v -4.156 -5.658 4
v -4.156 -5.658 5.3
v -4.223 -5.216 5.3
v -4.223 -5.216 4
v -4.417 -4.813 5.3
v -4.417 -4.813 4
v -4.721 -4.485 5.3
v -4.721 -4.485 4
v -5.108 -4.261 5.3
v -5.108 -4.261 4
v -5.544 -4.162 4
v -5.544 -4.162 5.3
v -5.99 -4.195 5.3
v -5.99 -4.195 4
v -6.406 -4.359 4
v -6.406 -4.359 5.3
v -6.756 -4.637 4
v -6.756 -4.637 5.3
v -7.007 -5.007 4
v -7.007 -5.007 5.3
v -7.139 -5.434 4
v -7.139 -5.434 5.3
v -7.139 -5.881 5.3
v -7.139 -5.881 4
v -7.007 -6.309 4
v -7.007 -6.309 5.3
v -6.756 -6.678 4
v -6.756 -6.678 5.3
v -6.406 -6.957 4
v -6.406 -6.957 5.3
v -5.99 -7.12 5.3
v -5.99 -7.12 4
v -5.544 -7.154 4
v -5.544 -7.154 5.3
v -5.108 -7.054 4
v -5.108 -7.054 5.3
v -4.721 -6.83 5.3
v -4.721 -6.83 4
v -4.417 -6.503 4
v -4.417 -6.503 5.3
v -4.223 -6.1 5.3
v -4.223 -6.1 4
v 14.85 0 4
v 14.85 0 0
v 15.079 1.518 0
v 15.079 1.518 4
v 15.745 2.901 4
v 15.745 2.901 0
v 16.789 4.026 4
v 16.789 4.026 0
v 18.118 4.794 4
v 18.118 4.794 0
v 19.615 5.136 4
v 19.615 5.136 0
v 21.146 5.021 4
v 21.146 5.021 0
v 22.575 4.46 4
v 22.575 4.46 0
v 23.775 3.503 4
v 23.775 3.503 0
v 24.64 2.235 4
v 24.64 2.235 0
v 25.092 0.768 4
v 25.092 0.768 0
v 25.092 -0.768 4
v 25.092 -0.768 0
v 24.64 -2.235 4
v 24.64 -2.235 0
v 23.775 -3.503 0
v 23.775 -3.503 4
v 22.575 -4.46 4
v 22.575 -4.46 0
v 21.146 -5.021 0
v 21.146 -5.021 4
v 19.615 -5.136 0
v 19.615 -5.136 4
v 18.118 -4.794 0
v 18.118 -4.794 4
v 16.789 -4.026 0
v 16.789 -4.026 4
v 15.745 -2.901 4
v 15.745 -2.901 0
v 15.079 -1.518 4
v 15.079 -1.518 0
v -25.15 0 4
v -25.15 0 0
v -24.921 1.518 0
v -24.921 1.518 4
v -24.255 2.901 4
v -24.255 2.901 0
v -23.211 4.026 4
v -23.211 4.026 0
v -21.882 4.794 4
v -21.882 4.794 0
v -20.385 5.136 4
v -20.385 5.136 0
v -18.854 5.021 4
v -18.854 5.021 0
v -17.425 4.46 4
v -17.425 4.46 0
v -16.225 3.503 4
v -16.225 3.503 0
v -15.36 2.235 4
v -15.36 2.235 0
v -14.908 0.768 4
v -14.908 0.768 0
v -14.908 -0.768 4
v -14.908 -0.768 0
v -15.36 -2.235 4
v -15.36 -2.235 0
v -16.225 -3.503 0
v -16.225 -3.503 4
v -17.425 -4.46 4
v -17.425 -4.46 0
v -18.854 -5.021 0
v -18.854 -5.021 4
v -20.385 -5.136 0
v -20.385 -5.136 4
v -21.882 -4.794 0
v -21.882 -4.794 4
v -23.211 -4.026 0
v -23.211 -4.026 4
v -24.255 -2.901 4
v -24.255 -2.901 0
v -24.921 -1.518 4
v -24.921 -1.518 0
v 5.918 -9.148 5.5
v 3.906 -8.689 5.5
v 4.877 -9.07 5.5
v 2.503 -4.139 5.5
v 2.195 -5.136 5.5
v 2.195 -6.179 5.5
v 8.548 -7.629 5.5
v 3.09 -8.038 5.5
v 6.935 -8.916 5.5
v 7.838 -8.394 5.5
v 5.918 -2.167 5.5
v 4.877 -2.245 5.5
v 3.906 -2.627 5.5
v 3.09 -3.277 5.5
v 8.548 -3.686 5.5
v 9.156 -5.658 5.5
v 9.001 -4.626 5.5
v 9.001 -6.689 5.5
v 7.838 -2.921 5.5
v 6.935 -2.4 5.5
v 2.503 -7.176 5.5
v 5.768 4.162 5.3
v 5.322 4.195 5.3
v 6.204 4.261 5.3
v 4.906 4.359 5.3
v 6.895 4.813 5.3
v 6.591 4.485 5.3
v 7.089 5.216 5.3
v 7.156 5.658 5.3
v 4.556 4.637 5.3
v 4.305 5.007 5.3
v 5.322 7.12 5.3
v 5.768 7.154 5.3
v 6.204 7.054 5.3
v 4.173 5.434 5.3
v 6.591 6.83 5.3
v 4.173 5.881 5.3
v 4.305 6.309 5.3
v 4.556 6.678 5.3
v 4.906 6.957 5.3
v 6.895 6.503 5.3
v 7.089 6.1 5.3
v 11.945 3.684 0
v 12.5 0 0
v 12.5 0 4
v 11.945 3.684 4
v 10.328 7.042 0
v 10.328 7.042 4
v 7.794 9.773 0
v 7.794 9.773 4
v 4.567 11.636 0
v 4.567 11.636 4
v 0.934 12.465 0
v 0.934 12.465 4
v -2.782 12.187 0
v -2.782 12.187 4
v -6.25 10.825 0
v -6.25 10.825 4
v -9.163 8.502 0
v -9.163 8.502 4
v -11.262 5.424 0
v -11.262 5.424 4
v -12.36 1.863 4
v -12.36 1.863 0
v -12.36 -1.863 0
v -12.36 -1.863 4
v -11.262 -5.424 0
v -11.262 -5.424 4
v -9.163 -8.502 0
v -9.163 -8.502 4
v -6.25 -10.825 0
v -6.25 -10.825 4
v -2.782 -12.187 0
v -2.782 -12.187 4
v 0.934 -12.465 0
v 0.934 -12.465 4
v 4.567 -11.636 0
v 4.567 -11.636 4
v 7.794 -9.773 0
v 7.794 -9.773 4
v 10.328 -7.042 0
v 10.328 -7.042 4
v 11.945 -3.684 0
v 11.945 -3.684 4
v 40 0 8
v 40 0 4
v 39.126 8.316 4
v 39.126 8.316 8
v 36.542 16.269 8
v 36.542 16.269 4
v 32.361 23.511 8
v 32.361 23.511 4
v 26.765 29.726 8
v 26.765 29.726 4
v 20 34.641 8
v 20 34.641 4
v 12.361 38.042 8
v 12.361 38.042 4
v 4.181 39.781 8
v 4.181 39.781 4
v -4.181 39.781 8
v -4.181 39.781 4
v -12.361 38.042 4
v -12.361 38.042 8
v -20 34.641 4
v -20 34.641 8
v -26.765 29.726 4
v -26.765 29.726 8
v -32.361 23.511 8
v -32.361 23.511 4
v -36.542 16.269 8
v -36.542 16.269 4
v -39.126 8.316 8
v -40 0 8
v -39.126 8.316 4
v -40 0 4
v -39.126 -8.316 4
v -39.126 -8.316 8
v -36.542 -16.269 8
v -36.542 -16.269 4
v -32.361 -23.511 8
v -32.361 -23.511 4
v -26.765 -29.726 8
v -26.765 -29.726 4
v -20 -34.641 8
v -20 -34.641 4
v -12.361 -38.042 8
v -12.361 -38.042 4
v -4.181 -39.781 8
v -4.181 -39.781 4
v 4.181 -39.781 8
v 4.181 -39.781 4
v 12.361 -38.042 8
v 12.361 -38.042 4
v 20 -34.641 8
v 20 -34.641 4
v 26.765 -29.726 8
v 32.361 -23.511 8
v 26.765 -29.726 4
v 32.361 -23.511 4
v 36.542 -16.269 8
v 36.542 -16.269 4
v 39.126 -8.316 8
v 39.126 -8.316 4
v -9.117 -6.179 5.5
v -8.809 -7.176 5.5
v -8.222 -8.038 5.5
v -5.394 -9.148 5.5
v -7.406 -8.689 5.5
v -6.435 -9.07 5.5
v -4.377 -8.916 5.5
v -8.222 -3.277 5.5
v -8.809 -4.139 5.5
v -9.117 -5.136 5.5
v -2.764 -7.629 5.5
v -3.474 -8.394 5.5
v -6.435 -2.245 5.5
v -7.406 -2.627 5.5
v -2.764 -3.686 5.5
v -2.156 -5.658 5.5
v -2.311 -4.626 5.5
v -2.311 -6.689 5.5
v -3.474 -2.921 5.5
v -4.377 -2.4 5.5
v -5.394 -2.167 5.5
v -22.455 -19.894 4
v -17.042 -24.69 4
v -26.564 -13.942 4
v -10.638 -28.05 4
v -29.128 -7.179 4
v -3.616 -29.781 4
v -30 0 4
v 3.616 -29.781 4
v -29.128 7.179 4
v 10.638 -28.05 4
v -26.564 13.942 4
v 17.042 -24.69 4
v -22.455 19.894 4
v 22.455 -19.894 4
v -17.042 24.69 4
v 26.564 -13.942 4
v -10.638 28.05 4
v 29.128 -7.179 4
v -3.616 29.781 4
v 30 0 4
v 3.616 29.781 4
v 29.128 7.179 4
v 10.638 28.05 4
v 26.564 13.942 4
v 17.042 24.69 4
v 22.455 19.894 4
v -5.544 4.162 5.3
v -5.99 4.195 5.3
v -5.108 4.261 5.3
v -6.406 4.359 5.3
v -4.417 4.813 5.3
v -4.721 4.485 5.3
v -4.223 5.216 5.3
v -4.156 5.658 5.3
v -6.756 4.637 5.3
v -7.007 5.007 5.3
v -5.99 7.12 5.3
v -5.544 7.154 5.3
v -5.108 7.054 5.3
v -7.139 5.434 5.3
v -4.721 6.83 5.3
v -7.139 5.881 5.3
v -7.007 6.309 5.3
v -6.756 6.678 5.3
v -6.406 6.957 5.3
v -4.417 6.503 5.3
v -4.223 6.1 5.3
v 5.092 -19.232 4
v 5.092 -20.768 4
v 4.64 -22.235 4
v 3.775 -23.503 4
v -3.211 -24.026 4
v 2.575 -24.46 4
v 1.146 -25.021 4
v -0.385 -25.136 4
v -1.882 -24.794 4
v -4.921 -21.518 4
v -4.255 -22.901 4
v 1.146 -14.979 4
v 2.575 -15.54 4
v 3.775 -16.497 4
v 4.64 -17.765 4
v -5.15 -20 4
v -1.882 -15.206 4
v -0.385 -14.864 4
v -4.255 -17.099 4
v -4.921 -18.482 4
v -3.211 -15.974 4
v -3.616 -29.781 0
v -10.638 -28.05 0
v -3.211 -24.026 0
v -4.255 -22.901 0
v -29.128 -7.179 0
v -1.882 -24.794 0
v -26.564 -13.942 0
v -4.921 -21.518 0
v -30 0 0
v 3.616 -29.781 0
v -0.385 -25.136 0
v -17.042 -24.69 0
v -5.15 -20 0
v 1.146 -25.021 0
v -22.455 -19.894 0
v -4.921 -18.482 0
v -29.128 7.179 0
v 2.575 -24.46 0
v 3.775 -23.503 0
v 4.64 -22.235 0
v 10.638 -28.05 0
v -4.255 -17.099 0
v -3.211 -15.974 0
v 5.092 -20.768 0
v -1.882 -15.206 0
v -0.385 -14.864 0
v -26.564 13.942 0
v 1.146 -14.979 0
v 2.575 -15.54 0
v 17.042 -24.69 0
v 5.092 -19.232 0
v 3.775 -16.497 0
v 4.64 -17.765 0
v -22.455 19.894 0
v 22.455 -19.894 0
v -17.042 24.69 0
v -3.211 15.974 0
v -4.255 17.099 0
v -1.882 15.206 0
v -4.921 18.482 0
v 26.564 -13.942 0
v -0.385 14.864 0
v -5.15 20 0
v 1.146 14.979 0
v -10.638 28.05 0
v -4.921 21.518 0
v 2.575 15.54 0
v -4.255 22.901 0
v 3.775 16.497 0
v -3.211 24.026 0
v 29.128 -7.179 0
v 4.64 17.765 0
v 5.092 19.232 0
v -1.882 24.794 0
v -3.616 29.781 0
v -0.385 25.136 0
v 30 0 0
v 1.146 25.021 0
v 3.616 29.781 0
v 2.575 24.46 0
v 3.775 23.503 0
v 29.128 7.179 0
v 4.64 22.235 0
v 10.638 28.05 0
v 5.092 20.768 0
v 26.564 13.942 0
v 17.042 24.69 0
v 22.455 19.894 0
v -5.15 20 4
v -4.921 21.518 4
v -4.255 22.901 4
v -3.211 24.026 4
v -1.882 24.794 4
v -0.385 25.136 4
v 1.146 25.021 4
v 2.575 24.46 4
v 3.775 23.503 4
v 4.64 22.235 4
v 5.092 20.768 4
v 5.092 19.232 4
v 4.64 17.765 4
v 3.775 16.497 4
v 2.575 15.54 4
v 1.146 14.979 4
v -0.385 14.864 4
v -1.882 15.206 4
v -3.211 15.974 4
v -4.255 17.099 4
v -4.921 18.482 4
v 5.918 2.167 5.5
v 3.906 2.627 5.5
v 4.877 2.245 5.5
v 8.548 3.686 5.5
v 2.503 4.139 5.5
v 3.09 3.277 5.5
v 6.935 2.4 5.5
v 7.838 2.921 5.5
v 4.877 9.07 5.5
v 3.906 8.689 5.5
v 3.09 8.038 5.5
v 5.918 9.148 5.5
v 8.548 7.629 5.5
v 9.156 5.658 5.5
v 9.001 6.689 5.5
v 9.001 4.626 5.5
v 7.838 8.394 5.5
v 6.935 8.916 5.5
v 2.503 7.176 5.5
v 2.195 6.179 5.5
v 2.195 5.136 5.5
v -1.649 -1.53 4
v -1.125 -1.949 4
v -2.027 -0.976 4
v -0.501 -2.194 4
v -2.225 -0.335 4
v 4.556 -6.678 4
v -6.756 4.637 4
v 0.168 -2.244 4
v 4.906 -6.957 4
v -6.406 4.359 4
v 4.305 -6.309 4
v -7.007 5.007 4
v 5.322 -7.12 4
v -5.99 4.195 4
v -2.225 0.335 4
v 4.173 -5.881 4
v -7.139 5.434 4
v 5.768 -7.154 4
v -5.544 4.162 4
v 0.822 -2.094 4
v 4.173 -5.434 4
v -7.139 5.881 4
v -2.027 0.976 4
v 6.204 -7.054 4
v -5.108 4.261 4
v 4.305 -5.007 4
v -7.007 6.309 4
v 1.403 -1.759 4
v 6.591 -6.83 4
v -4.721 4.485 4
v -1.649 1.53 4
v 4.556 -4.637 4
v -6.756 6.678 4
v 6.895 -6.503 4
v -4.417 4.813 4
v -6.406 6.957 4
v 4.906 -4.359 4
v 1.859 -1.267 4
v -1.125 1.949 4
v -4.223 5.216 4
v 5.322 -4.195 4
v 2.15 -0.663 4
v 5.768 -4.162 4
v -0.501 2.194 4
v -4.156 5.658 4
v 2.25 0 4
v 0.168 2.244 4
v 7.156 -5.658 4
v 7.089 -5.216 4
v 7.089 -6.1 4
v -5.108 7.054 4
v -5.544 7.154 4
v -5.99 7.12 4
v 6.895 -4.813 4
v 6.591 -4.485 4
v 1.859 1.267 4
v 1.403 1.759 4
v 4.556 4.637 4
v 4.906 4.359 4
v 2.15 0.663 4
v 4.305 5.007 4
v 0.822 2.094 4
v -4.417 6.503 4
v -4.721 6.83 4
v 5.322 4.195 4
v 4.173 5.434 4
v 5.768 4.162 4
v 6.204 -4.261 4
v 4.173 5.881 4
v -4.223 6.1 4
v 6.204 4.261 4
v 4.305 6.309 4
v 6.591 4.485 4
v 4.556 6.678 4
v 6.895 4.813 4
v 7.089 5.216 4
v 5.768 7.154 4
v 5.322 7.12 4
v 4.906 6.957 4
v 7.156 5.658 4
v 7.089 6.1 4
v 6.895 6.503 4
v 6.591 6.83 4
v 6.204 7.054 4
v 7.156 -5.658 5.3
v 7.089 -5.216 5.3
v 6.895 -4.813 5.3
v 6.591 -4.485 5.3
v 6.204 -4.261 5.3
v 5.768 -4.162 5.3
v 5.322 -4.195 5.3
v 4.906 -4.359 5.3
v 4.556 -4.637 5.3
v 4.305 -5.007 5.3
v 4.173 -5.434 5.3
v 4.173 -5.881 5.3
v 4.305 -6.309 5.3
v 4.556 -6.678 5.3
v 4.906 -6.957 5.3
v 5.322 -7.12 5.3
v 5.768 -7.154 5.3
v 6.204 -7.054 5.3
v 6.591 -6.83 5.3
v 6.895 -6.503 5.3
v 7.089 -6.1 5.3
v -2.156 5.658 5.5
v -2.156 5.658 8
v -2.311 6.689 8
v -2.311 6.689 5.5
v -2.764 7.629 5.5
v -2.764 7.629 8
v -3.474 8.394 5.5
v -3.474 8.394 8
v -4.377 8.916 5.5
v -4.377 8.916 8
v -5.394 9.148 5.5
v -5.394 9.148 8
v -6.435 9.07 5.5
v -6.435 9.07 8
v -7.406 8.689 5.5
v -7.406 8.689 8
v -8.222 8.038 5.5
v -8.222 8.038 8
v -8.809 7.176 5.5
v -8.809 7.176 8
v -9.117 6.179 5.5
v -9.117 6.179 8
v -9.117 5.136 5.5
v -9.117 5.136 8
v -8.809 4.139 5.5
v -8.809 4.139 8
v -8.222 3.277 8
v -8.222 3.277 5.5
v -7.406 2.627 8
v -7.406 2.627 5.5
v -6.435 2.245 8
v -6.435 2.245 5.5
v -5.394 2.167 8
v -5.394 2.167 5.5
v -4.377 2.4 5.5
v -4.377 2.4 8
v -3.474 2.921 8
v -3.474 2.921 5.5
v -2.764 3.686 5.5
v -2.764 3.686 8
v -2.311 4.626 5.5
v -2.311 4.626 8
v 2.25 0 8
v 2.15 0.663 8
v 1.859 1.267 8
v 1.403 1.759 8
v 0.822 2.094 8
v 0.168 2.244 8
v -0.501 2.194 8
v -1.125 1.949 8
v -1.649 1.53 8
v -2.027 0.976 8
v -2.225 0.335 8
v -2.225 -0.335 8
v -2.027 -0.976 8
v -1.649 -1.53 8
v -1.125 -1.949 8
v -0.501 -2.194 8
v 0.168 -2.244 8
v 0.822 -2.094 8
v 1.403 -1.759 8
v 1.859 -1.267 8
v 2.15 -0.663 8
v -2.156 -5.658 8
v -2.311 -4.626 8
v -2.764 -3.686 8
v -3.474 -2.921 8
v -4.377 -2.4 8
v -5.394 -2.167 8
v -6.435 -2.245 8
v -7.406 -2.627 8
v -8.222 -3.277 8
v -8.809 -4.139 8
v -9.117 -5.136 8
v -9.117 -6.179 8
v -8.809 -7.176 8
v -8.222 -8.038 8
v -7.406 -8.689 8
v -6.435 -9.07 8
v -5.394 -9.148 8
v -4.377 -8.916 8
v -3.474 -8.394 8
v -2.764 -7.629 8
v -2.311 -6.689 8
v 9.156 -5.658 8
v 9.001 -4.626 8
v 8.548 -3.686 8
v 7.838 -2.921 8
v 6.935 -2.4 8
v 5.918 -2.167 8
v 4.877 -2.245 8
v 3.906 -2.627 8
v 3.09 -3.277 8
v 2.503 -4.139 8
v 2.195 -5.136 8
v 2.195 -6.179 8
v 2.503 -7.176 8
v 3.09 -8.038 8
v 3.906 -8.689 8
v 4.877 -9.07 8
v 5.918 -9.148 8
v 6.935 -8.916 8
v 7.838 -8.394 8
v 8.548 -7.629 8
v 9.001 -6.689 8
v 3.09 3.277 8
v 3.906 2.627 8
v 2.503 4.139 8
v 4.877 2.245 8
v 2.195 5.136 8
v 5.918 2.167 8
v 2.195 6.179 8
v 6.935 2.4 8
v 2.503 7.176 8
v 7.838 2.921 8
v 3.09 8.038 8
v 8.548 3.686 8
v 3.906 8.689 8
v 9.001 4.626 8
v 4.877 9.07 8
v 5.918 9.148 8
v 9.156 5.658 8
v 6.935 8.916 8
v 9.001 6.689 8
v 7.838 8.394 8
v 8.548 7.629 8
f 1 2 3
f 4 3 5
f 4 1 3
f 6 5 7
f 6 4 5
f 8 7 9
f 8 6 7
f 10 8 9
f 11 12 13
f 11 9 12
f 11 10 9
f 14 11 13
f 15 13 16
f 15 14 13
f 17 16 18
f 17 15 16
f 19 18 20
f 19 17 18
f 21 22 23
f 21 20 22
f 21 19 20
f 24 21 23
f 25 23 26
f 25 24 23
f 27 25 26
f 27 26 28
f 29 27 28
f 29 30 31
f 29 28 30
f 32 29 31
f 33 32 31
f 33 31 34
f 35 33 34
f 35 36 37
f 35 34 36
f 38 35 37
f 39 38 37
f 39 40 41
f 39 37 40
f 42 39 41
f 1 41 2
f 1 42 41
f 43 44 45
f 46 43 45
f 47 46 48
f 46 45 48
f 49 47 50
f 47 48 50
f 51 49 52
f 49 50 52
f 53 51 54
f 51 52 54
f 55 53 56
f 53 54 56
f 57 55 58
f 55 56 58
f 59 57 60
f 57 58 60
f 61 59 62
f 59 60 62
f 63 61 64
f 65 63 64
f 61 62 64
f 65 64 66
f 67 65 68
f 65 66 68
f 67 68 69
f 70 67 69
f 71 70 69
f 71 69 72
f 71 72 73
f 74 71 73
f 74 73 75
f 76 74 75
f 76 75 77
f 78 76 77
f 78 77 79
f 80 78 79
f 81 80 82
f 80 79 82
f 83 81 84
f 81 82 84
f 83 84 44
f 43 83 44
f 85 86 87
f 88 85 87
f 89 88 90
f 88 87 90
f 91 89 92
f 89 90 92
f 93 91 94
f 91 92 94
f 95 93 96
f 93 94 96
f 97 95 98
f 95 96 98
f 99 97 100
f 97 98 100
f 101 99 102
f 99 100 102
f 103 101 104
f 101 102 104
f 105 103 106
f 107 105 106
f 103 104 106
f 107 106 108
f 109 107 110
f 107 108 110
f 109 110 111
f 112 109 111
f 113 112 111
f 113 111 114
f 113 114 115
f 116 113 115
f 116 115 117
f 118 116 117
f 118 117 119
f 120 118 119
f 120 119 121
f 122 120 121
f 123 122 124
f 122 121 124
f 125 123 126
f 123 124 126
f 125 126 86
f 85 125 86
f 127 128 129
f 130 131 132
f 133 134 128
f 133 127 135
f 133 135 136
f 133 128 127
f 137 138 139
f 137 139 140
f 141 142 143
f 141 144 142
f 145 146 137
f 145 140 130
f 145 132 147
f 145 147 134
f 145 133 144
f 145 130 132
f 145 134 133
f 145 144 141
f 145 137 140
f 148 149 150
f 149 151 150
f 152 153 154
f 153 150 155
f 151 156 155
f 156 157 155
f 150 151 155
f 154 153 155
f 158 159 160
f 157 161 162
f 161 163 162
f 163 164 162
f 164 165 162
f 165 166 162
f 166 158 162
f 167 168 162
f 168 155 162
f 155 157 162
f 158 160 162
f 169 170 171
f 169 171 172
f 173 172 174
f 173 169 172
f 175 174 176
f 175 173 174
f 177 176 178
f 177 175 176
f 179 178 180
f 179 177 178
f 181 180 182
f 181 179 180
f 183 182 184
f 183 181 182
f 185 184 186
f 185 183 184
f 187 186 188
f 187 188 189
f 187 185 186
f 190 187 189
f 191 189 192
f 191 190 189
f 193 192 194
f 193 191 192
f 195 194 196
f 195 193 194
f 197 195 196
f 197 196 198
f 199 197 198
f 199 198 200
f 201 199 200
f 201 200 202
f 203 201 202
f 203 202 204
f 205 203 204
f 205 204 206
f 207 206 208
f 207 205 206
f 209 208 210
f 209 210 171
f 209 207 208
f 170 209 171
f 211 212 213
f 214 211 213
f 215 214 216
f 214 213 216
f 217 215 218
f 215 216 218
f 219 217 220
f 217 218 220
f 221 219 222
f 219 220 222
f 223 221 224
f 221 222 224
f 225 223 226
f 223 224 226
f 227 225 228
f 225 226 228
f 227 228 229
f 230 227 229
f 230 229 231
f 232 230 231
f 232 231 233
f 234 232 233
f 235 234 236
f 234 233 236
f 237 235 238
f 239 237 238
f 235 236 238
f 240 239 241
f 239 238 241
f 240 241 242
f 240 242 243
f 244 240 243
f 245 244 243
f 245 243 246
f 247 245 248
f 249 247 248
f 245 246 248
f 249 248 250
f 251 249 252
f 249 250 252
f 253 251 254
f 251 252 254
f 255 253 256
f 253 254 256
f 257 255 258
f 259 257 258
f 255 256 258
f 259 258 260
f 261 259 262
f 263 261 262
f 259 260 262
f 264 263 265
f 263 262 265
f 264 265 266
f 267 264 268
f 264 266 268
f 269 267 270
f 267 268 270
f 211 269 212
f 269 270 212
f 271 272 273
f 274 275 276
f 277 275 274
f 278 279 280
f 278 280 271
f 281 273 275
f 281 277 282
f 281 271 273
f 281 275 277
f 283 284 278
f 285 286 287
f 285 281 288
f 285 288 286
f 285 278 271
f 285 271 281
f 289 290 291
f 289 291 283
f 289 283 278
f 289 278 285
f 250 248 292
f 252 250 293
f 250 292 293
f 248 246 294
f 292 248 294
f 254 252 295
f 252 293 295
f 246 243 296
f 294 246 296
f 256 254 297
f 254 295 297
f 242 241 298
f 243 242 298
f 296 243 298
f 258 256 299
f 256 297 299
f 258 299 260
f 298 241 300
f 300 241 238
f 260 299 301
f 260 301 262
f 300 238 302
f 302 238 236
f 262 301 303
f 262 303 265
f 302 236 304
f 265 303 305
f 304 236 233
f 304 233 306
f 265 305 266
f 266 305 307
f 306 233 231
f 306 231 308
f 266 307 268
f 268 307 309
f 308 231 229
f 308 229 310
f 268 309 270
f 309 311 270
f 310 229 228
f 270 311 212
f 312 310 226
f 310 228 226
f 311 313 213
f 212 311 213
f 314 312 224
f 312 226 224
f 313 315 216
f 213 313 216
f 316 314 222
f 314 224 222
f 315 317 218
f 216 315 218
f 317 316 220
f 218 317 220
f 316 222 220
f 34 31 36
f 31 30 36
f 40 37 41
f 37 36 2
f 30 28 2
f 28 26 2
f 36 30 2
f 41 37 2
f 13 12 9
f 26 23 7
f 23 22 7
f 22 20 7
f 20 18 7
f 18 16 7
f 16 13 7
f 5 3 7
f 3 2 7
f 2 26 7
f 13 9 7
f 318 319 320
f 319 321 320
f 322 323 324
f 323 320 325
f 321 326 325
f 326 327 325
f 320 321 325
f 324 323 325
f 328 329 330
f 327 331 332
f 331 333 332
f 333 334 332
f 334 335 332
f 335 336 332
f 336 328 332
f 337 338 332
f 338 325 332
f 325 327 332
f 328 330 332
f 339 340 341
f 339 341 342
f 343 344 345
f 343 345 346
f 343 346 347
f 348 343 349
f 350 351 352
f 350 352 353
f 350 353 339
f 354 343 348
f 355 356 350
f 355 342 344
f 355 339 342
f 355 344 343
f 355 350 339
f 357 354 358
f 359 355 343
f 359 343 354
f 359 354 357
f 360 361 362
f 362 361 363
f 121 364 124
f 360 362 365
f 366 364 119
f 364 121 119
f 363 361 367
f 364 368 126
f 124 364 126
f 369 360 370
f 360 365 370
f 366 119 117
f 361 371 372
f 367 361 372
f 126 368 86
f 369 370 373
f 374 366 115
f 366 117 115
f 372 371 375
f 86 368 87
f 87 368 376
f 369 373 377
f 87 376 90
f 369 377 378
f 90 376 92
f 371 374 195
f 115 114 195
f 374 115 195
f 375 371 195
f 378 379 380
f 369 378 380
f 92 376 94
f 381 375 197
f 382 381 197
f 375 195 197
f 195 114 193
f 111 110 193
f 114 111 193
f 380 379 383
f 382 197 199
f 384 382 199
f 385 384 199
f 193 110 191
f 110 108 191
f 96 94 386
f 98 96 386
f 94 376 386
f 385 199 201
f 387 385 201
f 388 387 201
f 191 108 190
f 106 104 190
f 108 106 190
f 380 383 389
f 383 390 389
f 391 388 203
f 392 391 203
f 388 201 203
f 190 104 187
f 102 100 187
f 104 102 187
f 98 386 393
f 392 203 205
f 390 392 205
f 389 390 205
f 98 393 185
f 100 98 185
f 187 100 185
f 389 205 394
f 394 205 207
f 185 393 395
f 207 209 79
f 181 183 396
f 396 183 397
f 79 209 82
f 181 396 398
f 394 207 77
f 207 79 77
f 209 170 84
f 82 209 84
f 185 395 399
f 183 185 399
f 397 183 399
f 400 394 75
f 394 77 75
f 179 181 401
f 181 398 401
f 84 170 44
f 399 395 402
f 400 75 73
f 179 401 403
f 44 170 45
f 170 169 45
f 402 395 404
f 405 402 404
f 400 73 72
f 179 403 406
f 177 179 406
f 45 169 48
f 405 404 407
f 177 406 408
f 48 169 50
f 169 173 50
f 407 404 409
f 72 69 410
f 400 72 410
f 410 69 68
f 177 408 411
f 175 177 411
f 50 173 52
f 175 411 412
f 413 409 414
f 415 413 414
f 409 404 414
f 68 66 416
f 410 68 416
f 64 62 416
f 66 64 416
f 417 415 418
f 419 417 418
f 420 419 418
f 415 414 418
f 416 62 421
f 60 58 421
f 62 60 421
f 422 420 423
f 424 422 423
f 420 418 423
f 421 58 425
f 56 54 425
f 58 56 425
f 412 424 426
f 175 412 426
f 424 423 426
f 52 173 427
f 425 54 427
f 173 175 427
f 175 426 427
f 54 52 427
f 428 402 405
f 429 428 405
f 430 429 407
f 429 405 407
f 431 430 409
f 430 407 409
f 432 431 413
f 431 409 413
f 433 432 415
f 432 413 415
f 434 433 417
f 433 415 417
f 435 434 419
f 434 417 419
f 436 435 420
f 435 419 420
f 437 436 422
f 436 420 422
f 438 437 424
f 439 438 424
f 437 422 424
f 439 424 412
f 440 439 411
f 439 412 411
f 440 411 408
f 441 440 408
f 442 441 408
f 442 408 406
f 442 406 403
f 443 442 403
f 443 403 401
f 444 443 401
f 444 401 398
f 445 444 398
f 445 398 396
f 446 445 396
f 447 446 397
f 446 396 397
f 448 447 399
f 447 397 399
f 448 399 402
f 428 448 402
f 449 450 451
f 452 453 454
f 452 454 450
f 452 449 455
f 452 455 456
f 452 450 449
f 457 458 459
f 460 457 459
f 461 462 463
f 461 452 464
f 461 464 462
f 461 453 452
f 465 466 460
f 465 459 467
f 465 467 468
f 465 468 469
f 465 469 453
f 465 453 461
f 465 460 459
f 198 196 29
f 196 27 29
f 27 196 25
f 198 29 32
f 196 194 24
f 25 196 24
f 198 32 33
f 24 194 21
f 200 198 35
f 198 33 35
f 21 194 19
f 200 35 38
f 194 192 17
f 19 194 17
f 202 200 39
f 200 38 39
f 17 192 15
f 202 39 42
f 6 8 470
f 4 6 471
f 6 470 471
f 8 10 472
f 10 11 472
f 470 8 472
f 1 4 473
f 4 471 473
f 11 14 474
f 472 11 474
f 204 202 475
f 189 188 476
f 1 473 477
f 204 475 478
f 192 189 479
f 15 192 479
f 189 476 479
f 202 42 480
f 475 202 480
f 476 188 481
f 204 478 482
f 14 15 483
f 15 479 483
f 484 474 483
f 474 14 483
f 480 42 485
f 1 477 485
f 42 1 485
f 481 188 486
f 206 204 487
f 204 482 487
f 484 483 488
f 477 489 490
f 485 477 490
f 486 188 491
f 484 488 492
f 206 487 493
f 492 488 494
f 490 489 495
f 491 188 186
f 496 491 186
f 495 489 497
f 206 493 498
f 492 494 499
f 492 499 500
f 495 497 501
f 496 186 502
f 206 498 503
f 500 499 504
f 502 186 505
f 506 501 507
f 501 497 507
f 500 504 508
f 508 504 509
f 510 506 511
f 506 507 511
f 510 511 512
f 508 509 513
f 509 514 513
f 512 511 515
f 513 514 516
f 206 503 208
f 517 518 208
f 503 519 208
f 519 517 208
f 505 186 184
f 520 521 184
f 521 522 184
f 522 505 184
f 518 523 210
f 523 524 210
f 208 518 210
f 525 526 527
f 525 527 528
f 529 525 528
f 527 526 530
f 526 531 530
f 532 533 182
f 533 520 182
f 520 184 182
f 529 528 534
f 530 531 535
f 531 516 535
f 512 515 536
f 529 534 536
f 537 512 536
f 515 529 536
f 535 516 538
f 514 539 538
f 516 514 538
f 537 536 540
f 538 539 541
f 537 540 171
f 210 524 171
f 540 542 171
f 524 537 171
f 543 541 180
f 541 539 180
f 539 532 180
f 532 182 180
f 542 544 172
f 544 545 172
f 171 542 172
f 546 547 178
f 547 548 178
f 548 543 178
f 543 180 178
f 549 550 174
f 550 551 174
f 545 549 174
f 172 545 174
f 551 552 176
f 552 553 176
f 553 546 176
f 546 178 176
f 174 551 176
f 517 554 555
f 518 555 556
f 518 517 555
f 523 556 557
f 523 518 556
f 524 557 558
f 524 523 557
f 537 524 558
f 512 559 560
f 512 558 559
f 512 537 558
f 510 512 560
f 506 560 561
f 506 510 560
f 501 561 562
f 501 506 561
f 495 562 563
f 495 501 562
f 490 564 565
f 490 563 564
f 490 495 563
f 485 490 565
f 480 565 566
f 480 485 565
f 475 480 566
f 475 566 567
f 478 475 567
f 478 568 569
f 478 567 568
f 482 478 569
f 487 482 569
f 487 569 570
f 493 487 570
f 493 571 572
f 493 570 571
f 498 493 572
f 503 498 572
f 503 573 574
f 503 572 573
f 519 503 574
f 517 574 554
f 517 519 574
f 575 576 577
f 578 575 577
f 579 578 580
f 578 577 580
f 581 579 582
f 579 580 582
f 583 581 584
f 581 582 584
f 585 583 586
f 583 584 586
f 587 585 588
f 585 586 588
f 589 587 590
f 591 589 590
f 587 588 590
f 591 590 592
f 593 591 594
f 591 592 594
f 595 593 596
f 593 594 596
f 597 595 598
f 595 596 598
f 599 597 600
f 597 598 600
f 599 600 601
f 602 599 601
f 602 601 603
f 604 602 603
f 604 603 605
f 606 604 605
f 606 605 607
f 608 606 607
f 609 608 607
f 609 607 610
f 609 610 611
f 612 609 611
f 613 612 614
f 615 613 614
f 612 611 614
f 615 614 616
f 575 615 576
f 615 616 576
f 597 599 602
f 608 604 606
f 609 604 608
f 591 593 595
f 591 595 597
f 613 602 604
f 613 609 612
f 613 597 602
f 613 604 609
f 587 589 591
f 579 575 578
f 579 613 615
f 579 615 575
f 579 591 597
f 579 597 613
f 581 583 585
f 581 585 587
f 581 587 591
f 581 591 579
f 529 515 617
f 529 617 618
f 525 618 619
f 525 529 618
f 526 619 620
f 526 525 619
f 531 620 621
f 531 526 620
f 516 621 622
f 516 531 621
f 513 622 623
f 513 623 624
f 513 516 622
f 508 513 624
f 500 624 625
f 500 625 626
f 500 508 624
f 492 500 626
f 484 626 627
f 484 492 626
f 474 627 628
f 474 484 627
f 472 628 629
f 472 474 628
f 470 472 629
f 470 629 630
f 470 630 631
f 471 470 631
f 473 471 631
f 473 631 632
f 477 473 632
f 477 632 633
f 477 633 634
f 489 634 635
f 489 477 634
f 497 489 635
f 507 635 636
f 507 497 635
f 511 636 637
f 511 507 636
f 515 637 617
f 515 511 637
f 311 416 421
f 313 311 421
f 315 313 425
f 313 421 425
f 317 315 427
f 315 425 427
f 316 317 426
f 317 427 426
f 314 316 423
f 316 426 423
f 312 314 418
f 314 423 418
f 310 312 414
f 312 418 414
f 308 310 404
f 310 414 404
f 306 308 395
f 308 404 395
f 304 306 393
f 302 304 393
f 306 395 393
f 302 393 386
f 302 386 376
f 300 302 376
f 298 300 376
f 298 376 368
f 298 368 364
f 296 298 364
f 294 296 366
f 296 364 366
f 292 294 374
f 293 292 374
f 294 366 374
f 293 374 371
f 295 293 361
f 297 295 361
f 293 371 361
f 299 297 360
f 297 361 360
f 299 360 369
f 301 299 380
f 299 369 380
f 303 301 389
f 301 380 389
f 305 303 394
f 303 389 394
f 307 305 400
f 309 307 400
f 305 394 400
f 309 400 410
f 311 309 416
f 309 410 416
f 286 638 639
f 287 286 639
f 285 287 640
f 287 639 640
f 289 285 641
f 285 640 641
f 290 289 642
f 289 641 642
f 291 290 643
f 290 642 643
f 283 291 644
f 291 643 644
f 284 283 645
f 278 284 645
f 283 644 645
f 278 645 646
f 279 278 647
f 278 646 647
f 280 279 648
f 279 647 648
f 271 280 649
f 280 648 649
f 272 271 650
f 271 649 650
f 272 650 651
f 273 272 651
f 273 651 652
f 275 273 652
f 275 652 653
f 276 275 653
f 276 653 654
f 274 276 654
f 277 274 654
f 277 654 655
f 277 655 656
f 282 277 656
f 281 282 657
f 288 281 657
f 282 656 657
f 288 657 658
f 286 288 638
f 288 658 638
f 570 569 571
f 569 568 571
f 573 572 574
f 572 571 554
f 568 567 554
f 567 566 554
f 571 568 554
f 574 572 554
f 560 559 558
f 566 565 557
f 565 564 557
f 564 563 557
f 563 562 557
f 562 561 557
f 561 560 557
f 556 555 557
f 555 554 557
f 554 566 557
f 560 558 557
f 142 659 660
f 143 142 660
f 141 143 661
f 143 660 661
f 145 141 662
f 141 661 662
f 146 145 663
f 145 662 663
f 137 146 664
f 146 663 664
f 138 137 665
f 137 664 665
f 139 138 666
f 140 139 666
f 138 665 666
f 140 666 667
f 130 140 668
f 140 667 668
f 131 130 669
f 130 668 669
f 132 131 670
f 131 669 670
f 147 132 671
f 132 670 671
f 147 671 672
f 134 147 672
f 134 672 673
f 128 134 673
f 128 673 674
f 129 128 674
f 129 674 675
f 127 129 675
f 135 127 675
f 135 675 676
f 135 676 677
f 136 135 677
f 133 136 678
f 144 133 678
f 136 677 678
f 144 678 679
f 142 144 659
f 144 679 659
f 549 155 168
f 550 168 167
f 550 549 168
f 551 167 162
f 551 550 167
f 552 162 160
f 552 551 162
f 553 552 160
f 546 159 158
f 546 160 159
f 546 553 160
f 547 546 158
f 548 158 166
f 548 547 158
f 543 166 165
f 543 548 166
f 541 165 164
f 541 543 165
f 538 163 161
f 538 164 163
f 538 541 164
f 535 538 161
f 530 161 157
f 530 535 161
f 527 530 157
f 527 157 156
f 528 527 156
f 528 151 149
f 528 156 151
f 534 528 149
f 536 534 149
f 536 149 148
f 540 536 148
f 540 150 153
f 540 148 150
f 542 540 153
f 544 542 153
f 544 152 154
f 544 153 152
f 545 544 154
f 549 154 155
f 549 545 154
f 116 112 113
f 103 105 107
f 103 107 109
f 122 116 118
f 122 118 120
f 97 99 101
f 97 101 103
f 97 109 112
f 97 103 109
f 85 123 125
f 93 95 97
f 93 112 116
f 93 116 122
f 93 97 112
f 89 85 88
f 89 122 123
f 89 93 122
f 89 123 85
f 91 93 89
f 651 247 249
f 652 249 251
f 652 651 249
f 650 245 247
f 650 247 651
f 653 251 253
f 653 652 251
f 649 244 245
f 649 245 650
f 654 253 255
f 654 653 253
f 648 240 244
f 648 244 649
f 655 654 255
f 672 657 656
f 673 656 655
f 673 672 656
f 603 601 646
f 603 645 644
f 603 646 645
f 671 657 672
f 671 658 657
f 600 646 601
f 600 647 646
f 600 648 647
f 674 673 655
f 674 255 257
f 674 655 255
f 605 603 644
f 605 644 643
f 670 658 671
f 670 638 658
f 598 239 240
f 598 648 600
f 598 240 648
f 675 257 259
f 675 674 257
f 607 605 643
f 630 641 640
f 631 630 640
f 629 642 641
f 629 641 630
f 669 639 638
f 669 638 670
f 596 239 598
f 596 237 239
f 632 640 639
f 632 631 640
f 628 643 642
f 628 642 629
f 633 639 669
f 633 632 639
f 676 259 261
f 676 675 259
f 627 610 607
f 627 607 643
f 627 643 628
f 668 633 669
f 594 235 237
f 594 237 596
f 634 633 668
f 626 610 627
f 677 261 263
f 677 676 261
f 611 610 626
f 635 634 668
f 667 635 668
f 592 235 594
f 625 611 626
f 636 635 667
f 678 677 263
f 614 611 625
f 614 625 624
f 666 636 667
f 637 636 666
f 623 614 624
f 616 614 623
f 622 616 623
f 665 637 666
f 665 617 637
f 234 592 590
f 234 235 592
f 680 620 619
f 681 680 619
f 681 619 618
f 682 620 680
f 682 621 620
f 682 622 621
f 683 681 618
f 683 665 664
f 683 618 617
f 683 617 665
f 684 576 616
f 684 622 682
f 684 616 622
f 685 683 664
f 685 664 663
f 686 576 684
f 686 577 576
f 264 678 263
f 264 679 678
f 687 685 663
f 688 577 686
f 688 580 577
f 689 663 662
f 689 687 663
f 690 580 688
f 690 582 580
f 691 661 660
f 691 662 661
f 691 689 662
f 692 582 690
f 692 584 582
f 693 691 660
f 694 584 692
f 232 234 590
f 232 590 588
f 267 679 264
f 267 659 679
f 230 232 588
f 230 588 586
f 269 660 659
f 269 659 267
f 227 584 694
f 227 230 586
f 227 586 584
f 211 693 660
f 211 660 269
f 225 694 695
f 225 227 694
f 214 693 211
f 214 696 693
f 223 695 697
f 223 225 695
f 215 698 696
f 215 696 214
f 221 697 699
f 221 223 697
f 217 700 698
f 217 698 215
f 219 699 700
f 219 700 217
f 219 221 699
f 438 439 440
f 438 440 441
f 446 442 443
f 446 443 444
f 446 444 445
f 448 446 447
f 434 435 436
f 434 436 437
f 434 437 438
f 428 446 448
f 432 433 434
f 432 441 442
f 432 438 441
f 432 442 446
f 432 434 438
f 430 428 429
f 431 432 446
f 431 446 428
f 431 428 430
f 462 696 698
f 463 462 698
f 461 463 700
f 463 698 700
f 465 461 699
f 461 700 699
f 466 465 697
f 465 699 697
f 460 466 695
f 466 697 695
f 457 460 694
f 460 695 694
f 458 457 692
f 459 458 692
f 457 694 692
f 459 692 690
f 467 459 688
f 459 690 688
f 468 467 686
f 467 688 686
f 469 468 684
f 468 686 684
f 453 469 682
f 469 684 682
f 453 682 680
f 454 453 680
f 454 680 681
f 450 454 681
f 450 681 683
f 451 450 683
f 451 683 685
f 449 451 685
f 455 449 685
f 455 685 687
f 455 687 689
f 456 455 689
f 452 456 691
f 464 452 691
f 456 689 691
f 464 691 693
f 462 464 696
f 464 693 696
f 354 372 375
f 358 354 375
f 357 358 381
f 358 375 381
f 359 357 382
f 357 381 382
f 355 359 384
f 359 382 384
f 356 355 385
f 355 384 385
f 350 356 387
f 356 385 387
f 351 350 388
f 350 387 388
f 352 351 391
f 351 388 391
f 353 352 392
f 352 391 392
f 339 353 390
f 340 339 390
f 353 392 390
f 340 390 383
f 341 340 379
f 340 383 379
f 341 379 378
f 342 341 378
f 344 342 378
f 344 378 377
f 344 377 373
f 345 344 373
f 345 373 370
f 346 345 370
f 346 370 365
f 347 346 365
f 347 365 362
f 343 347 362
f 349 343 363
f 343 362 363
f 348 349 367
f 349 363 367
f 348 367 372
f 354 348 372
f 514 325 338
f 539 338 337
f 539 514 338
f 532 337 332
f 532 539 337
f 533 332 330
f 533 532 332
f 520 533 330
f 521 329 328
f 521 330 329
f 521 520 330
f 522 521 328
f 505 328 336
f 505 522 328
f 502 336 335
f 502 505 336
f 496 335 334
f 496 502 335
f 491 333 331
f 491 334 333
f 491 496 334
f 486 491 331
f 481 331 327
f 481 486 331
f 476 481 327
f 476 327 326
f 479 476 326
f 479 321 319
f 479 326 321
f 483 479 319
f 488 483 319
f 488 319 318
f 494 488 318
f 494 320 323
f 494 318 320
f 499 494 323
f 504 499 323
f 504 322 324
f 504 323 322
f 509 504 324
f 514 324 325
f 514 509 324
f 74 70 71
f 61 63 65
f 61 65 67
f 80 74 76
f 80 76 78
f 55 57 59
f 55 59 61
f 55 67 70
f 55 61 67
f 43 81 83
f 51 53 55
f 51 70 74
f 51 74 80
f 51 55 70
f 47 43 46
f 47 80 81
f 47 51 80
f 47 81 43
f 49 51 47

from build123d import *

# Parameters (mm, degrees)
SKETCH1_R           = 30
SKETCH1_R_2         = 12.5
BOSS_EXTRUDE1_DEPTH = 4
SKETCH2_R           = 40
SKETCH2_R_2         = 2.25
SKETCH2_R_3         = 1.5
BOSS_EXTRUDE2_DEPTH = 4
SKETCH3_R           = 3.5
CUT_EXTRUDE1_DEPTH  = 2.5
SKETCH4_R           = 5.15
CUT_EXTRUDE2_DEPTH  = 4
SKETCH5_R           = 3.5
BOSS_EXTRUDE3_DEPTH = 0.2


with BuildPart() as part:
    # Sketch1 → Boss-Extrude1 (new body)
    with BuildSketch(Plane.XY):
        Circle(SKETCH1_R)
        Circle(SKETCH1_R_2, mode=Mode.SUBTRACT)
    extrude(amount=BOSS_EXTRUDE1_DEPTH)

    # Sketch2 → Boss-Extrude2 (add)
    with BuildSketch(Plane.XY.offset(4)):
        Circle(SKETCH2_R)
        Circle(SKETCH2_R_2, mode=Mode.SUBTRACT)
        with Locations((-5.655999742, 5.657708628)):
            Circle(SKETCH2_R_3, mode=Mode.SUBTRACT)
        with Locations((-5.655999742, -5.657708628)):
            Circle(SKETCH2_R_3, mode=Mode.SUBTRACT)
        with Locations((5.655999742, -5.657708628)):
            Circle(SKETCH2_R_3, mode=Mode.SUBTRACT)
        with Locations((5.655999742, 5.657708628)):
            Circle(SKETCH2_R_3, mode=Mode.SUBTRACT)
    extrude(amount=BOSS_EXTRUDE2_DEPTH)

    # Sketch3 → Cut-Extrude1 (cut)
    with BuildSketch(Plane.XY.offset(8)):
        with Locations((-5.655999742, 5.657708628)):
            Circle(SKETCH3_R)
        with Locations((5.655999742, 5.657708628)):
            Circle(SKETCH3_R)
        with Locations((5.655999742, -5.657708628)):
            Circle(SKETCH3_R)
        with Locations((-5.655999742, -5.657708628)):
            Circle(SKETCH3_R)
    extrude(amount=-CUT_EXTRUDE1_DEPTH, mode=Mode.SUBTRACT)

    # Sketch4 → Cut-Extrude2 (cut)
    with BuildSketch(Plane(origin=(0, 0, 0), x_dir=(-1, 0, 0), z_dir=(0, 0, -1))):
        with Locations((-20, 0)):
            Circle(SKETCH4_R)
        with Locations((0, -20)):
            Circle(SKETCH4_R)
        with Locations((20, 0)):
            Circle(SKETCH4_R)
        with Locations((0, 20)):
            Circle(SKETCH4_R)
    extrude(amount=-CUT_EXTRUDE2_DEPTH, mode=Mode.SUBTRACT)

    # Sketch5 → Boss-Extrude3 (add)
    with BuildSketch(Plane.XY.offset(5.5)):
        with Locations((-5.655999742, 5.657708628)):
            Circle(SKETCH5_R)
        with Locations((5.655999742, 5.657708628)):
            Circle(SKETCH5_R)
        with Locations((-5.655999742, -5.657708628)):
            Circle(SKETCH5_R)
        with Locations((5.655999742, -5.657708628)):
            Circle(SKETCH5_R)
    extrude(amount=-BOSS_EXTRUDE3_DEPTH)


solid = part.part
